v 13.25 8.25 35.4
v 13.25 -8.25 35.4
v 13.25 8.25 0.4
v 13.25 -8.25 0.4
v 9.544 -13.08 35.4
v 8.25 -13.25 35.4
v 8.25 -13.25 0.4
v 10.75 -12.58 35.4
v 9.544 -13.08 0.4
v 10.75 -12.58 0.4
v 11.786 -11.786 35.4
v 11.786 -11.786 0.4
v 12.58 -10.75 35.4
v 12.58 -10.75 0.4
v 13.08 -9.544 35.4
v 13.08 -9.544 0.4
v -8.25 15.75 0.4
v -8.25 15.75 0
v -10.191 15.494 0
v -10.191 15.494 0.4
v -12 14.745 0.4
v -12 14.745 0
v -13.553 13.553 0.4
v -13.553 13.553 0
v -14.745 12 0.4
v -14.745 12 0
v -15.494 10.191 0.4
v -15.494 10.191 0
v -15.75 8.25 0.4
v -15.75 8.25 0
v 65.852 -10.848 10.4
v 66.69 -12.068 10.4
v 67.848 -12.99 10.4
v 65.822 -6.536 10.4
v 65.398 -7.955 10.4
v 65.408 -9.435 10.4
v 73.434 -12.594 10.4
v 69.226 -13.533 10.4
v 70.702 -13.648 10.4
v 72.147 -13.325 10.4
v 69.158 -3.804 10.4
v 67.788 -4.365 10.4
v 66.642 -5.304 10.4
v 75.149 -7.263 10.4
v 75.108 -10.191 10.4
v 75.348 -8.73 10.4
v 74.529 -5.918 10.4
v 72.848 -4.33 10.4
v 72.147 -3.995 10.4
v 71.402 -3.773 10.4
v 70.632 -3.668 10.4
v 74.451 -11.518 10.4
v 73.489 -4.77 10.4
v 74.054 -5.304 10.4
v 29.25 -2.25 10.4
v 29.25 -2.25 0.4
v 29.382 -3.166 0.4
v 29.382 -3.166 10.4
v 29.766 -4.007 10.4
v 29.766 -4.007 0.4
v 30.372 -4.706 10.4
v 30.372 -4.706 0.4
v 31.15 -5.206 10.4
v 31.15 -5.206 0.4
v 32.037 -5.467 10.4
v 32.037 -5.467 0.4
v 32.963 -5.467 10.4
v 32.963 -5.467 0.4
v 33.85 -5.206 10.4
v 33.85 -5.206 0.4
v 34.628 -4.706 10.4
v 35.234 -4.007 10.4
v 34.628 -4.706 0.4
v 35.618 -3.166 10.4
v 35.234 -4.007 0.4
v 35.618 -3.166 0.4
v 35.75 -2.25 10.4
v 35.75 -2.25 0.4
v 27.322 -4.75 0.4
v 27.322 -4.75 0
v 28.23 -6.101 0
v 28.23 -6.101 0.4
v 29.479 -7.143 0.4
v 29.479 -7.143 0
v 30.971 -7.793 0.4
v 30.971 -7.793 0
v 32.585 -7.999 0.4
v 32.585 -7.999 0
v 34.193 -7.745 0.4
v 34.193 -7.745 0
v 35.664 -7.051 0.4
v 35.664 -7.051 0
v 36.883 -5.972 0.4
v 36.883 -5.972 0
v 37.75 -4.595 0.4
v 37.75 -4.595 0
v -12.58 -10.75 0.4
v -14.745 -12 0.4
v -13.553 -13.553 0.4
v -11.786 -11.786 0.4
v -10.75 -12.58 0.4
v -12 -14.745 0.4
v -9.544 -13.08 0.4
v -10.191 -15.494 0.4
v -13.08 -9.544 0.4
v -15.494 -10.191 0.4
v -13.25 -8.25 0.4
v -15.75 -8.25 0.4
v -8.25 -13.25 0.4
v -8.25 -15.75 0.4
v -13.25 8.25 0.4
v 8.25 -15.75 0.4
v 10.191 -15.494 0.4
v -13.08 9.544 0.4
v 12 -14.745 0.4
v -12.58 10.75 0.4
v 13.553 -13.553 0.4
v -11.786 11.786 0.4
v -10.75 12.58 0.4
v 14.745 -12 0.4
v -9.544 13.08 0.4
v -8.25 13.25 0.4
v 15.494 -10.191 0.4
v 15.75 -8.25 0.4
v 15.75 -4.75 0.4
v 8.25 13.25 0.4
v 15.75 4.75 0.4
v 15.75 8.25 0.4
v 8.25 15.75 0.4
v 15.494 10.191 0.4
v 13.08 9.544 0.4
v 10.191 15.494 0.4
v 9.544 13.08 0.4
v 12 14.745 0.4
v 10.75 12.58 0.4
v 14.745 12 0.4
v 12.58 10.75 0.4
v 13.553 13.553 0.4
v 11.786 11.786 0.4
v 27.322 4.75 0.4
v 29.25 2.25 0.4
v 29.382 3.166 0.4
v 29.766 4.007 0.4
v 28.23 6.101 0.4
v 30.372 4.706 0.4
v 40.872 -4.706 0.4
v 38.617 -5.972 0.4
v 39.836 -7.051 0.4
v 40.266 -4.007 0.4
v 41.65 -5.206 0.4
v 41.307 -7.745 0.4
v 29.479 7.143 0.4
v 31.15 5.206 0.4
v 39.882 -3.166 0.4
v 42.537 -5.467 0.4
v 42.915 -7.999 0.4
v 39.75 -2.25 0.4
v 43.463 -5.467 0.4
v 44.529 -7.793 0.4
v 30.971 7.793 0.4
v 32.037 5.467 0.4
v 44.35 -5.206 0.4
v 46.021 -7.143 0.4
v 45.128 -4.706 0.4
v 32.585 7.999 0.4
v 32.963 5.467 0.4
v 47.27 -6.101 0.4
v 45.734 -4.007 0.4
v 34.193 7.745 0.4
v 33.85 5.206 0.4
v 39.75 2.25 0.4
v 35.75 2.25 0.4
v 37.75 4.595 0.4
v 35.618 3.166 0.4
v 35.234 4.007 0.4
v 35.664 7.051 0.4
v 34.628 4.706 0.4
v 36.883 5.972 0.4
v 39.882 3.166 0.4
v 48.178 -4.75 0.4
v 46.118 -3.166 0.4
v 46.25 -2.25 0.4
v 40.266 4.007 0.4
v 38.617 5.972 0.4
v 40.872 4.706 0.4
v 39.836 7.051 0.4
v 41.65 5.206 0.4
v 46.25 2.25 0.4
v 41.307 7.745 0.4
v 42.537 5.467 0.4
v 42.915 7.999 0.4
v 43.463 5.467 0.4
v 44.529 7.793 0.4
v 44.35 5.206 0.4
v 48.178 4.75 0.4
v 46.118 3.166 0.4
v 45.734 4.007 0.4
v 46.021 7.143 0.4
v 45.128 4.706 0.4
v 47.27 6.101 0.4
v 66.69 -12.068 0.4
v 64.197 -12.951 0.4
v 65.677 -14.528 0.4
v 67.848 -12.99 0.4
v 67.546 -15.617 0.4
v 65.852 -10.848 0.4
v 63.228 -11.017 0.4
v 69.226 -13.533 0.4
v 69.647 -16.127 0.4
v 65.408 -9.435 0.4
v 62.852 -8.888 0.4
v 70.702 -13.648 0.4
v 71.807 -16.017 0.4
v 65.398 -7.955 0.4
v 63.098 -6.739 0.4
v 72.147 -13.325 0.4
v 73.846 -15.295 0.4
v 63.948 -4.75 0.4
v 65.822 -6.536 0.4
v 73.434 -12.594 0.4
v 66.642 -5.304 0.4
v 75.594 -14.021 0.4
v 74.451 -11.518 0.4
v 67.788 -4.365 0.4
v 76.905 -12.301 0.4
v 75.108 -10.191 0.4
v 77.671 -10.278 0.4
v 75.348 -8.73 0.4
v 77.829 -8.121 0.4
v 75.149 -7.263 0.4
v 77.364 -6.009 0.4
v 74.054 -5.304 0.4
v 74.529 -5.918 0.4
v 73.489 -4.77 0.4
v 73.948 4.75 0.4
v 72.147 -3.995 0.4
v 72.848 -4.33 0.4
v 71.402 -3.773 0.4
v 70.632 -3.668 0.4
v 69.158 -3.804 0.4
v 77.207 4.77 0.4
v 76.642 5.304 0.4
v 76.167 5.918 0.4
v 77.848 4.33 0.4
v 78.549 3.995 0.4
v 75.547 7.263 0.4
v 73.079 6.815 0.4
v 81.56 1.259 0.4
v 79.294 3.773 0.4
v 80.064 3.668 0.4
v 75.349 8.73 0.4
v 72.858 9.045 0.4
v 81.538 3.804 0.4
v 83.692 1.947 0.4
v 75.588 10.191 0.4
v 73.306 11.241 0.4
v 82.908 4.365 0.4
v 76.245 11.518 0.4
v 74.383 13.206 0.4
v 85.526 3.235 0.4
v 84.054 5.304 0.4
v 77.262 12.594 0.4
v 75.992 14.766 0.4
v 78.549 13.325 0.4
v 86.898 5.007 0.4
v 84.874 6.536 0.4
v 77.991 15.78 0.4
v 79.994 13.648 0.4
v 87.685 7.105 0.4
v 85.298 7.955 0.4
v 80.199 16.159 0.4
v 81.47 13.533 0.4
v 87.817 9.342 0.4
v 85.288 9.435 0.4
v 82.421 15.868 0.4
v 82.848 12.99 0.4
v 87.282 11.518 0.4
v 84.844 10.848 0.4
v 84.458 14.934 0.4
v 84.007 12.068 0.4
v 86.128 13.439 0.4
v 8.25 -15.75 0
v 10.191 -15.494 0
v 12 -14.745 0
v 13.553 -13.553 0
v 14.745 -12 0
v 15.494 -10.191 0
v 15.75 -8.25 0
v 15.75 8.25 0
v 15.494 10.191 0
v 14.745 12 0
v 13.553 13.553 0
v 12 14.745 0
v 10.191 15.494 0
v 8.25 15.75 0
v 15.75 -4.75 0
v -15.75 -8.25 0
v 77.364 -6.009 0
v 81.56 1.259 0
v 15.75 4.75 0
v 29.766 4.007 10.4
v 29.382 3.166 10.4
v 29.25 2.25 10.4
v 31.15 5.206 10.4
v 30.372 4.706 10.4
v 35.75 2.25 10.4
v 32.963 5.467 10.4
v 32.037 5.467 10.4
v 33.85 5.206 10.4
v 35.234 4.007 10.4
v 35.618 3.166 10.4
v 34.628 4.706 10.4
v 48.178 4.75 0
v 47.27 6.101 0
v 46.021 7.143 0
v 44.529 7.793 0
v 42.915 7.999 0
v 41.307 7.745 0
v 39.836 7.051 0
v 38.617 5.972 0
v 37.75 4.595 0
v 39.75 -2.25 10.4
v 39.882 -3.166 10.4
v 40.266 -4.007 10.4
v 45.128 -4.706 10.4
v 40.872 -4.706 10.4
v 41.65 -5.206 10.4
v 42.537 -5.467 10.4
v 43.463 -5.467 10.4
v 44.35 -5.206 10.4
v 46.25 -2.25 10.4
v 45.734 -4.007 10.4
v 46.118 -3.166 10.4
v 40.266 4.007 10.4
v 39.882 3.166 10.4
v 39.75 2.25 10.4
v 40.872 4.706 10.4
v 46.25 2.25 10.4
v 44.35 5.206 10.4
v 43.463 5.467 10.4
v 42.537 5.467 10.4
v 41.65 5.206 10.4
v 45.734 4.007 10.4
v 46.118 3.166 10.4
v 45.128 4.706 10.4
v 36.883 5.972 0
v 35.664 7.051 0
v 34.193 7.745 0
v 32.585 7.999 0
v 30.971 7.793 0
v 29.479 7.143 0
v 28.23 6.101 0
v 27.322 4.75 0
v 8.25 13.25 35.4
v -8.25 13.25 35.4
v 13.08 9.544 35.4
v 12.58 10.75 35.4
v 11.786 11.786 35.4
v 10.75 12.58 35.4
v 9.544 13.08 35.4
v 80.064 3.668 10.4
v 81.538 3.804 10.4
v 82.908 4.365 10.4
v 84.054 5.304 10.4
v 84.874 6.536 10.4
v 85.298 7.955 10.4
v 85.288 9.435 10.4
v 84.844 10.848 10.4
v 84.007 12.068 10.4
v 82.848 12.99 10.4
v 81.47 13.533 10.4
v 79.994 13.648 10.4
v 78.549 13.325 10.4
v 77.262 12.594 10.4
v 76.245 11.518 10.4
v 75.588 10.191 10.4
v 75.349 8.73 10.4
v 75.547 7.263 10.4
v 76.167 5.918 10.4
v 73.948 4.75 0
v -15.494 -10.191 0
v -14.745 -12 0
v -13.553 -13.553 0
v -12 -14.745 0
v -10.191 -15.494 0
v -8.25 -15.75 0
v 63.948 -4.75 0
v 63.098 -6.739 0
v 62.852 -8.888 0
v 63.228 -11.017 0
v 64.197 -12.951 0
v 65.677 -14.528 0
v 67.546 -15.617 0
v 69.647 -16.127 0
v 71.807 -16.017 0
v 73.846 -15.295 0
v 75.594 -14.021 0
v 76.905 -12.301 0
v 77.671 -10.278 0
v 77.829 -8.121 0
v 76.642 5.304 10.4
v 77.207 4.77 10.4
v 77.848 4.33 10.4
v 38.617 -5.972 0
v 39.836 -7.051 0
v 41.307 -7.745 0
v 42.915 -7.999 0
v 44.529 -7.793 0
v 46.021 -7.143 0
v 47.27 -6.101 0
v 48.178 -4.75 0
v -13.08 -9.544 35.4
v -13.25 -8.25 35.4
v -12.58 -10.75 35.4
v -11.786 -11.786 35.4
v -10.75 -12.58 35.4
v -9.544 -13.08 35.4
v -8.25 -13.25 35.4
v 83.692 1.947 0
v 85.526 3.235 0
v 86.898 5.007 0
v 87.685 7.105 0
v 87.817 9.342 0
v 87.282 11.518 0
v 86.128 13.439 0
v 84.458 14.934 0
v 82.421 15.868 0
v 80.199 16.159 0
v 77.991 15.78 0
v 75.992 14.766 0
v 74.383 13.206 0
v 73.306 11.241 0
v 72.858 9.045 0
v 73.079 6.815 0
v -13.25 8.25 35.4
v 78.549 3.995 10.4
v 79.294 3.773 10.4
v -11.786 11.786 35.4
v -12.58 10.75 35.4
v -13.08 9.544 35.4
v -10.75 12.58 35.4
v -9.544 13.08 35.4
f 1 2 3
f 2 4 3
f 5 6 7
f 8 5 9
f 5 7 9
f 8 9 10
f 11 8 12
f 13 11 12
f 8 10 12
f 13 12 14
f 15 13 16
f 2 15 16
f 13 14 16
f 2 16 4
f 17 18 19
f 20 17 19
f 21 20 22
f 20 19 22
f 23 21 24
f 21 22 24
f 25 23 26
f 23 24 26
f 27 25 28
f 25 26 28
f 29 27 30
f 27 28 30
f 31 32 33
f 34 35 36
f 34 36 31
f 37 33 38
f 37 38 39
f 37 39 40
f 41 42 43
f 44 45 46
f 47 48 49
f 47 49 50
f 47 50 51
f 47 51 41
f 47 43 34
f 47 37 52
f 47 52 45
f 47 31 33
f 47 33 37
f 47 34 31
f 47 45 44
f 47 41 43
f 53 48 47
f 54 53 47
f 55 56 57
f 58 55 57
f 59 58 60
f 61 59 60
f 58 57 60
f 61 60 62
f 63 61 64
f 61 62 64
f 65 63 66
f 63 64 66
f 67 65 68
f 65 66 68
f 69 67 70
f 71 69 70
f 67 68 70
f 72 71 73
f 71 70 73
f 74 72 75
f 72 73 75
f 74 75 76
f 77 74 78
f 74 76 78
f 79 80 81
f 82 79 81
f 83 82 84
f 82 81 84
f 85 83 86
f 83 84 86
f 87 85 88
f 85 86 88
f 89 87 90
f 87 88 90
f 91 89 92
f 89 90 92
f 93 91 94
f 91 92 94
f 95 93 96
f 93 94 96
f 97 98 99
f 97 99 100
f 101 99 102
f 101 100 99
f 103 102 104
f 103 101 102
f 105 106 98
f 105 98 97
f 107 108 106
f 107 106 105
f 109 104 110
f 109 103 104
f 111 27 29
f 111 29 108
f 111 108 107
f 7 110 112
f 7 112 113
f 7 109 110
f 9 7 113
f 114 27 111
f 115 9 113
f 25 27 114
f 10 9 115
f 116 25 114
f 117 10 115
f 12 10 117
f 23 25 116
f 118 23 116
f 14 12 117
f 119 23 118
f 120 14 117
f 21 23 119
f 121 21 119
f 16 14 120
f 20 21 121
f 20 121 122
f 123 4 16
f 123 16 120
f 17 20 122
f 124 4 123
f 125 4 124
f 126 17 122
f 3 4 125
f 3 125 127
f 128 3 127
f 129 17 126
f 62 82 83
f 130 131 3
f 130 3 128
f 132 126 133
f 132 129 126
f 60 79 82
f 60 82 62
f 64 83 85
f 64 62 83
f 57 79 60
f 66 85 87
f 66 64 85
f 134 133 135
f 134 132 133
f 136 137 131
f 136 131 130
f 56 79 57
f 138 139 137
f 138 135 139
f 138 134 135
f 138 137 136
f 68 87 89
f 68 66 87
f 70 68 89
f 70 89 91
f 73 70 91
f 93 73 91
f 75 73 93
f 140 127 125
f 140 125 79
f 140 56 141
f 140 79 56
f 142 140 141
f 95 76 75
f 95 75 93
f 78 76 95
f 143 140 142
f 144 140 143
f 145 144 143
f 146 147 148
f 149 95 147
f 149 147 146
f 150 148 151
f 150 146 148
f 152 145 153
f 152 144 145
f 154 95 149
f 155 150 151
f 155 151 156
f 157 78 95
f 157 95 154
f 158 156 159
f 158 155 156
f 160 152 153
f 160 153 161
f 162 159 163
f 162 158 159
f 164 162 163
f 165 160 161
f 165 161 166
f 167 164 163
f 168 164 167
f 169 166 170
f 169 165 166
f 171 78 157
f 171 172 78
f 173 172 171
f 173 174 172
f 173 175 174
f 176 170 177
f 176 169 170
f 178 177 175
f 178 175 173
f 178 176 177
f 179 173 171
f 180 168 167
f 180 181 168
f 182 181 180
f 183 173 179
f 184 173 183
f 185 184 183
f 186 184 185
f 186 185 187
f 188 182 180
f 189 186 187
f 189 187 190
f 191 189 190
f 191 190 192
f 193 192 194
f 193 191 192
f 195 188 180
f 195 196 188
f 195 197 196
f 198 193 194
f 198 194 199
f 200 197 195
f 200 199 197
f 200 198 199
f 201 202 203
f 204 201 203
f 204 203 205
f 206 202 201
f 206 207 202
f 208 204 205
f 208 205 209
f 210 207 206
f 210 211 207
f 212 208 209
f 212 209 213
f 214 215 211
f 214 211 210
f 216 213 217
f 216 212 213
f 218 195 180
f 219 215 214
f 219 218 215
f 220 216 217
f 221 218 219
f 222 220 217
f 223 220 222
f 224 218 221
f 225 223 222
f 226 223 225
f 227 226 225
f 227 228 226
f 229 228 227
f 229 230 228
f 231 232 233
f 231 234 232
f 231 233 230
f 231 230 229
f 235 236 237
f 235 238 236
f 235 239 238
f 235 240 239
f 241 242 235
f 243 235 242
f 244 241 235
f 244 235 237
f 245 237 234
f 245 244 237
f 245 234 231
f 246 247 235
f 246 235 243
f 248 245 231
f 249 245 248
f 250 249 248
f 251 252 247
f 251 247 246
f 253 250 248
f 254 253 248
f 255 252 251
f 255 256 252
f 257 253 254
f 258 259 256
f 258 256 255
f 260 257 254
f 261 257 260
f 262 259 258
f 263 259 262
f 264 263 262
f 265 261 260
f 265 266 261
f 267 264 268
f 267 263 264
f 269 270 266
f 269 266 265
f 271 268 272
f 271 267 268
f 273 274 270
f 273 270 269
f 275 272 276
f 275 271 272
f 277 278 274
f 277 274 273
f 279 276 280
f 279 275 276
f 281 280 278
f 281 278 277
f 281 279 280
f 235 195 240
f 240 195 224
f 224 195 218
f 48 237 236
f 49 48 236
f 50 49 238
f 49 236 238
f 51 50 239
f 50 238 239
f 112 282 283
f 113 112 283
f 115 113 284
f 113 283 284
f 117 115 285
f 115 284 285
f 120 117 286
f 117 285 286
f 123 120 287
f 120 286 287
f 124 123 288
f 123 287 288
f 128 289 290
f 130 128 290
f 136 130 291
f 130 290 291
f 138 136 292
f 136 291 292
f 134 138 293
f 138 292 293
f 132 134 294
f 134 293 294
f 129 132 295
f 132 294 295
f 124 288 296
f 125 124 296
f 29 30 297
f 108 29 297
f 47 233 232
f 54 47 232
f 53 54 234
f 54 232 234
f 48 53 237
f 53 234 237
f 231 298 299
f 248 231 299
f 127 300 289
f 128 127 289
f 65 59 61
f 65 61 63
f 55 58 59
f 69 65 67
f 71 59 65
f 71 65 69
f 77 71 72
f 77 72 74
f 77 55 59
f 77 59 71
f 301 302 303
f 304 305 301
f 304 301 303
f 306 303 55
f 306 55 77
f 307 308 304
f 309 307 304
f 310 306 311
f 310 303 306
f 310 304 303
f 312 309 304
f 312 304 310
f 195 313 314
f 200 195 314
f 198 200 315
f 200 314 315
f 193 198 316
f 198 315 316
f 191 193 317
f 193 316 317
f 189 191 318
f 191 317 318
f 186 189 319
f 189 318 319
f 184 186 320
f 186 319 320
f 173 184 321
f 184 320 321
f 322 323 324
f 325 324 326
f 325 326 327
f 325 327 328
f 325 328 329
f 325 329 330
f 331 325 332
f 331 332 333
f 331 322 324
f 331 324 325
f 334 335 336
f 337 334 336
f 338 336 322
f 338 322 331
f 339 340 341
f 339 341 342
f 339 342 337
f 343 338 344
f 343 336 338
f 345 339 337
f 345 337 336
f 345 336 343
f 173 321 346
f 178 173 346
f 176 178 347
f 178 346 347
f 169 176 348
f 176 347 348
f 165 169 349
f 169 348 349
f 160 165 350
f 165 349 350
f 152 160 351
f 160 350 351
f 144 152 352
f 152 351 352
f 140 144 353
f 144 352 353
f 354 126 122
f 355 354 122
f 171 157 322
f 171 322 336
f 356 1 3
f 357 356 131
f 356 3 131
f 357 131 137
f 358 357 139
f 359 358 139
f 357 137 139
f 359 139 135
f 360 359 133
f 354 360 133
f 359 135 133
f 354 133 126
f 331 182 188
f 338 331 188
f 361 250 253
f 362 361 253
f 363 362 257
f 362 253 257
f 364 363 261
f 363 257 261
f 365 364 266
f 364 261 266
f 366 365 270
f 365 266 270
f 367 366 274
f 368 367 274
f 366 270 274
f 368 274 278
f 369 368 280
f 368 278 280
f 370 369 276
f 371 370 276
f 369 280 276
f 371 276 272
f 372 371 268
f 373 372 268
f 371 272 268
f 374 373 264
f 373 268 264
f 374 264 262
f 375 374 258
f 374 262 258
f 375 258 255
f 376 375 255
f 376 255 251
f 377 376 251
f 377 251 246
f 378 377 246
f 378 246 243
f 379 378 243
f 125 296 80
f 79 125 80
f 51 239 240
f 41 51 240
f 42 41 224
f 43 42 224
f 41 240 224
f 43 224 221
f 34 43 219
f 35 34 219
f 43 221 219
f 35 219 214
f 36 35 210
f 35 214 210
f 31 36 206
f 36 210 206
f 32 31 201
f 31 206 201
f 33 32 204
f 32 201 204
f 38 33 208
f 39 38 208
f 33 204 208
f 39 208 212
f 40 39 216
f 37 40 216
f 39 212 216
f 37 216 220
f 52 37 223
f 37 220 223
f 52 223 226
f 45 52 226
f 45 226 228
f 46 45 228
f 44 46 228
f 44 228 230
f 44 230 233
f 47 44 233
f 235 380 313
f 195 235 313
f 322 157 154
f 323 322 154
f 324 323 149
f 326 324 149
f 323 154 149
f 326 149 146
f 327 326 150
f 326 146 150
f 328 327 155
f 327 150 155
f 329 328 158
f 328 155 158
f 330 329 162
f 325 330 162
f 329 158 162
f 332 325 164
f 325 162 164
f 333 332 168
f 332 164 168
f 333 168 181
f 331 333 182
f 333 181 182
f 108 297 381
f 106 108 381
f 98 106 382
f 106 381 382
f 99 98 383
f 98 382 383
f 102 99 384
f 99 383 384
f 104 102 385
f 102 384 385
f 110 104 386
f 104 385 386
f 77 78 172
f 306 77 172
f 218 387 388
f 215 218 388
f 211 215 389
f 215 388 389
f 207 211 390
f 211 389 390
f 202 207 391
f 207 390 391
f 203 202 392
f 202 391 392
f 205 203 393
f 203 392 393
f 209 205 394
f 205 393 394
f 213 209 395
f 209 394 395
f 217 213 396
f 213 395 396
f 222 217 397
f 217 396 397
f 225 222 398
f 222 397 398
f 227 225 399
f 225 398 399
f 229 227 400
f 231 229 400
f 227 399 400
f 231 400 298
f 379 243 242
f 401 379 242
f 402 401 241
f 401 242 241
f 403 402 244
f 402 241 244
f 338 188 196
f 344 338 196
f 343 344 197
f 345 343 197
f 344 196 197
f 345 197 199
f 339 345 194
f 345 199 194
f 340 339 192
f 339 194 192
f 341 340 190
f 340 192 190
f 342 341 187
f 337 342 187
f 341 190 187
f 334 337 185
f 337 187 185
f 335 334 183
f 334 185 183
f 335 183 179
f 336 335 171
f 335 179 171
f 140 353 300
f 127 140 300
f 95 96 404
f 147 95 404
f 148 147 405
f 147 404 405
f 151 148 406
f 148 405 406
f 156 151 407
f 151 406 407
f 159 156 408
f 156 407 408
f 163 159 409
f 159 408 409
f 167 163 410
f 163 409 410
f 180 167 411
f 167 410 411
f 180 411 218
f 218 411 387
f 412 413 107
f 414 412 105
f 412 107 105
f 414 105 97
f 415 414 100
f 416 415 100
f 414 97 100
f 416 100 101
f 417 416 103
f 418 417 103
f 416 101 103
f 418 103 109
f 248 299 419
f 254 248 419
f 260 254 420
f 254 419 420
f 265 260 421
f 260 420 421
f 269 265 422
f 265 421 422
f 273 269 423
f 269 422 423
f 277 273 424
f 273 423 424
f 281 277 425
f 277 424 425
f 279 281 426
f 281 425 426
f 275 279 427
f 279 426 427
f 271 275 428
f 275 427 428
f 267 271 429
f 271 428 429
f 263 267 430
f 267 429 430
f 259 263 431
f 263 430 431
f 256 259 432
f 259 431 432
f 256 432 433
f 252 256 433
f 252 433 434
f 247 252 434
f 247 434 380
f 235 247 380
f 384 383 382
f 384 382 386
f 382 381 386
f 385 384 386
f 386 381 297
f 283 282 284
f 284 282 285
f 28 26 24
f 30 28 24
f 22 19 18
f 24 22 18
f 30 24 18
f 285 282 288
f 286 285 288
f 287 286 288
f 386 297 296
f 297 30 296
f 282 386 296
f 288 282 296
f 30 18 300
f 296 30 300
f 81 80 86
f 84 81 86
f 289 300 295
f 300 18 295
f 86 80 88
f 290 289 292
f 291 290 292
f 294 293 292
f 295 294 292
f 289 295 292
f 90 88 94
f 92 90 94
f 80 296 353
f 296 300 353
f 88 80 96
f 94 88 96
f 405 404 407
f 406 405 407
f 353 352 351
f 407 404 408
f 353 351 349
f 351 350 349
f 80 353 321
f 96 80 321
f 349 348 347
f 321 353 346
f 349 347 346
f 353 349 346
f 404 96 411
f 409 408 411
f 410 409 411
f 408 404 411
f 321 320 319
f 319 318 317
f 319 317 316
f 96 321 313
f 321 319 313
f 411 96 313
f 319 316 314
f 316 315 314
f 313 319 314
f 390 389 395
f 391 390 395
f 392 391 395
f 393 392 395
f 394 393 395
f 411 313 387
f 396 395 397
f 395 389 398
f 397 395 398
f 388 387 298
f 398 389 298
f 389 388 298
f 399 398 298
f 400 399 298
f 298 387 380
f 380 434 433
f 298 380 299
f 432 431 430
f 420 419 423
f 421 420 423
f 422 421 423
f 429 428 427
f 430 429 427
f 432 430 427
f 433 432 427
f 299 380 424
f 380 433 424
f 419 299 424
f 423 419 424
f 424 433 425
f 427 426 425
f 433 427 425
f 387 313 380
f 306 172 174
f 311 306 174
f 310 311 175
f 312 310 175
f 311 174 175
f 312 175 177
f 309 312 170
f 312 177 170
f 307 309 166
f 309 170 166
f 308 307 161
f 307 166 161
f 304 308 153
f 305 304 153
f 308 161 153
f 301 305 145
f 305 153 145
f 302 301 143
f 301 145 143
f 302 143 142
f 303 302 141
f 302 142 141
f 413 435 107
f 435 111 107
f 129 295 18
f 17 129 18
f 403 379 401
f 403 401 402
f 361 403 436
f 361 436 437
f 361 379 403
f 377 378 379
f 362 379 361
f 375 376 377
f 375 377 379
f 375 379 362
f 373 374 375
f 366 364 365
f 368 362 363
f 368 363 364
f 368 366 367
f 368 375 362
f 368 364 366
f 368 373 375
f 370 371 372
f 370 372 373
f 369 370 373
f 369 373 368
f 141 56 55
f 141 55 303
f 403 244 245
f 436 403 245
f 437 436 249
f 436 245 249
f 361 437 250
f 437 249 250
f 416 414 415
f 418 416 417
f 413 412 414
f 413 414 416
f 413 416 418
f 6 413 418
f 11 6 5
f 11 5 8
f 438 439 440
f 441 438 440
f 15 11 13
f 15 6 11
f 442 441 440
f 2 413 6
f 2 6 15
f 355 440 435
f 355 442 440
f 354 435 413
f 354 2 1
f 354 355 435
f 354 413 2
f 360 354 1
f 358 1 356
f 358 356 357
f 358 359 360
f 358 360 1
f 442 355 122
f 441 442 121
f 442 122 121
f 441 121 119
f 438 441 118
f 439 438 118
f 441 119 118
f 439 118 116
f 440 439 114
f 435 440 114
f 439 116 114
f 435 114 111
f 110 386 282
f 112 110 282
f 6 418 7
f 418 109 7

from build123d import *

# Parameters (mm, degrees)
F0_W     = 16
F0_H     = 4.5
F0_W_2   = 6.5
F0_W_3   = 4
F1_DEPTH = 0.4
F2_W     = 6.5
F2_H     = 4.5
F3_DEPTH = 10
F4_DEPTH = 25


with BuildPart() as f1:
    # F0 (on Top) → F1 (new body)
    with BuildSketch(Plane.XY):
        with BuildLine():
            Line((15.75, 4.75), (15.75, 8.25))
            ThreePointArc((15.75, 8.25), (13.5533008589, 13.5533008589), (8.25, 15.75))
            Line((8.25, 15.75), (-8.25, 15.75))
            ThreePointArc((-8.25, 15.75), (-13.5533008589, 13.5533008589), (-15.75, 8.25))
            Line((-15.75, 8.25), (-15.75, -8.25))
            ThreePointArc((-15.75, -8.25), (-13.5533008589, -13.5533008589), (-8.25, -15.75))
            Line((-8.25, -15.75), (8.25, -15.75))
            ThreePointArc((8.25, -15.75), (13.5533008589, -13.5533008589), (15.75, -8.25))
            Line((15.75, -8.25), (15.75, -4.75))
            Line((15.75, -4.75), (27.3219212057, -4.75))
            ThreePointArc((27.3219212057, -4.75), (32.5853423404, -7.9993666334), (37.75, -4.5952078799))
            ThreePointArc((37.75, -4.5952078799), (42.9146576596, -7.9993666334), (48.1780787943, -4.75))
            Line((48.1780787943, -4.75), (63.9480829801, -4.75))
            ThreePointArc((63.9480829801, -4.75), (69.6474451199, -16.1274567319), (77.3637435709, -6.0087617221))
            Line((77.3637435709, -6.0087617221), (81.5596501878, 1.2587617221))
            ThreePointArc((81.5596501878, 1.2587617221), (83.4749132345, 15.4773568118), (73.9480829801, 4.75))
            Line((73.9480829801, 4.75), (48.1780787943, 4.75))
            ThreePointArc((48.1780787943, 4.75), (42.9146576596, 7.9993666334), (37.75, 4.5952078799))
            ThreePointArc((37.75, 4.5952078799), (32.5853423404, 7.9993666334), (27.3219212057, 4.75))
            Line((27.3219212057, 4.75), (15.75, 4.75))
        make_face()
        with BuildLine():
            ThreePointArc((-13.25, 8.25), (-11.7855339059, 11.7855339059), (-8.25, 13.25))
            Line((-8.25, 13.25), (-4.5, 13.25))
            Line((-4.5, 13.25), (4.5, 13.25))
            Line((4.5, 13.25), (8.25, 13.25))
            ThreePointArc((8.25, 13.25), (11.7855339059, 11.7855339059), (13.25, 8.25))
            Line((13.25, 8.25), (13.25, 4.5))
            Line((13.25, 4.5), (13.25, 2.25))
            Line((13.25, 2.25), (29.25, 2.25))
            ThreePointArc((29.25, 2.25), (32.5, 5.5), (35.75, 2.25))
            Line((35.75, 2.25), (39.75, 2.25))
            ThreePointArc((39.75, 2.25), (43, 5.5), (46.25, 2.25))
            Line((46.25, 2.25), (74.0490381057, 2.25))
            Line((74.0490381057, 2.25), (76.1669476654, 5.9183269633))
            ThreePointArc((76.1669476654, 5.9183269633), (82.8480762114, 12.9903810568), (80.0640619824, 3.6683269633))
            Line((80.0640619824, 3.6683269633), (74.5292047573, -5.9183269633))
            ThreePointArc((74.5292047573, -5.9183269633), (67.8480762114, -12.9903810568), (70.6320904403, -3.6683269633))
            Line((70.6320904403, -3.6683269633), (71.4509618943, -2.25))
            Line((71.4509618943, -2.25), (46.25, -2.25))
            ThreePointArc((46.25, -2.25), (43, -5.5), (39.75, -2.25))
            Line((39.75, -2.25), (35.75, -2.25))
            ThreePointArc((35.75, -2.25), (32.5, -5.5), (29.25, -2.25))
            Line((29.25, -2.25), (13.25, -2.25))
            Line((13.25, -2.25), (13.25, -4.5))
            Line((13.25, -4.5), (13.25, -8.25))
            ThreePointArc((13.25, -8.25), (11.7855339059, -11.7855339059), (8.25, -13.25))
            Line((8.25, -13.25), (4.5, -13.25))
            Line((4.5, -13.25), (-4.5, -13.25))
            Line((-4.5, -13.25), (-8.25, -13.25))
            ThreePointArc((-8.25, -13.25), (-11.7855339059, -11.7855339059), (-13.25, -8.25))
            Line((-13.25, -8.25), (-13.25, -4.5))
            Line((-13.25, -4.5), (-13.25, 4.5))
            Line((-13.25, 4.5), (-13.25, 8.25))
        make_face(mode=Mode.SUBTRACT)
        Polygon((74.0490381057, 2.25), (46.25, 2.25), (46.25, -2.25), (71.4509618943, -2.25), align=None)
        Polygon((4.5, -4.5), (0, -4.5), (-4.5, -4.5), (-4.5, -13.25), (4.5, -13.25), align=None)
        Polygon((-4.5, 0), (-4.5, 4.5), (-13.25, 4.5), (-13.25, -4.5), (-4.5, -4.5), align=None)
        Polygon((4.5, 13.25), (-4.5, 13.25), (-4.5, 4.5), (0, 4.5), (4.5, 4.5), align=None)
        Polygon((13.25, 4.5), (4.5, 4.5), (4.5, 0), (4.5, -4.5), (13.25, -4.5), (13.25, -2.25), (13.25, 2.25), align=None)
        with BuildLine():
            ThreePointArc((80.0640619824, 3.6683269633), (82.8480762114, 12.9903810568), (76.1669476654, 5.9183269633))
            ThreePointArc((76.1669476654, 5.9183269633), (77.8480762114, 4.3301270189), (80.0640619824, 3.6683269633))
        make_face()
        with BuildLine():
            ThreePointArc((74.5292047573, -5.9183269633), (72.8480762114, -4.3301270189), (70.6320904403, -3.6683269633))
            ThreePointArc((70.6320904403, -3.6683269633), (67.8480762114, -12.9903810568), (74.5292047573, -5.9183269633))
        make_face()
        with Locations((21.25, 0)):
            Rectangle(F0_W, F0_H)
        with BuildLine():
            Line((-4.5, -4.5), (-13.25, -4.5))
            Line((-13.25, -4.5), (-13.25, -8.25))
            ThreePointArc((-13.25, -8.25), (-11.7855339059, -11.7855339059), (-8.25, -13.25))
            Line((-8.25, -13.25), (-4.5, -13.25))
            Line((-4.5, -13.25), (-4.5, -4.5))
        make_face()
        with BuildLine():
            Line((8.25, 13.25), (4.5, 13.25))
            Line((4.5, 13.25), (4.5, 4.5))
            Line((4.5, 4.5), (13.25, 4.5))
            Line((13.25, 4.5), (13.25, 8.25))
            ThreePointArc((13.25, 8.25), (11.7855339059, 11.7855339059), (8.25, 13.25))
        make_face()
        with BuildLine():
            Line((13.25, -4.5), (4.5, -4.5))
            Line((4.5, -4.5), (4.5, -13.25))
            Line((4.5, -13.25), (8.25, -13.25))
            ThreePointArc((8.25, -13.25), (11.7855339059, -11.7855339059), (13.25, -8.25))
            Line((13.25, -8.25), (13.25, -4.5))
        make_face()
        with BuildLine():
            Line((-4.5, 13.25), (-8.25, 13.25))
            ThreePointArc((-8.25, 13.25), (-11.7855339059, 11.7855339059), (-13.25, 8.25))
            Line((-13.25, 8.25), (-13.25, 4.5))
            Line((-13.25, 4.5), (-4.5, 4.5))
            Line((-4.5, 4.5), (-4.5, 13.25))
        make_face()
        with BuildLine():
            ThreePointArc((0, 4.5), (-3.1819805153, 3.1819805153), (-4.5, 0))
            ThreePointArc((-4.5, 0), (-3.1819805153, -3.1819805153), (0, -4.5))
            ThreePointArc((0, -4.5), (3.1819805153, -3.1819805153), (4.5, 0))
            ThreePointArc((4.5, 0), (3.1819805153, 3.1819805153), (0, 4.5))
        make_face()
        with BuildLine():
            Line((76.1669476654, 5.9183269633), (74.0490381057, 2.25))
            Line((74.0490381057, 2.25), (71.4509618943, -2.25))
            Line((71.4509618943, -2.25), (70.6320904403, -3.6683269633))
            ThreePointArc((70.6320904403, -3.6683269633), (72.8480762114, -4.3301270189), (74.5292047573, -5.9183269633))
            Line((74.5292047573, -5.9183269633), (80.0640619824, 3.6683269633))
            ThreePointArc((80.0640619824, 3.6683269633), (77.8480762114, 4.3301270189), (76.1669476654, 5.9183269633))
        make_face()
        with Locations((43, 0)):
            Rectangle(F0_W_2, F0_H)
        with Locations((32.5, 0)):
            Rectangle(F0_W_2, F0_H)
        with Locations((37.75, 0)):
            Rectangle(F0_W_3, F0_H)
        with BuildLine():
            Line((46.25, -2.25), (39.75, -2.25))
            ThreePointArc((39.75, -2.25), (43, -5.5), (46.25, -2.25))
        make_face()
        with BuildLine():
            ThreePointArc((35.75, 2.25), (32.5, 5.5), (29.25, 2.25))
            Line((29.25, 2.25), (35.75, 2.25))
        make_face()
        with BuildLine():
            Line((35.75, -2.25), (29.25, -2.25))
            ThreePointArc((29.25, -2.25), (32.5, -5.5), (35.75, -2.25))
        make_face()
        with BuildLine():
            ThreePointArc((46.25, 2.25), (43, 5.5), (39.75, 2.25))
            Line((39.75, 2.25), (46.25, 2.25))
        make_face()
        with BuildLine():
            Line((4.5, 0), (4.5, 4.5))
            Line((4.5, 4.5), (0, 4.5))
            ThreePointArc((0, 4.5), (3.1819805153, 3.1819805153), (4.5, 0))
        make_face()
        with BuildLine():
            Line((0, 4.5), (-4.5, 4.5))
            Line((-4.5, 4.5), (-4.5, 0))
            ThreePointArc((-4.5, 0), (-3.1819805153, 3.1819805153), (0, 4.5))
        make_face()
        with BuildLine():
            ThreePointArc((0, -4.5), (-3.1819805153, -3.1819805153), (-4.5, 0))
            Line((-4.5, 0), (-4.5, -4.5))
            Line((-4.5, -4.5), (0, -4.5))
        make_face()
        with BuildLine():
            Line((4.5, -4.5), (4.5, 0))
            ThreePointArc((4.5, 0), (3.1819805153, -3.1819805153), (0, -4.5))
            Line((0, -4.5), (4.5, -4.5))
        make_face()
    extrude(amount=F1_DEPTH)

    # F2 (on face) → F3 (join)
    with BuildSketch(Plane.XY.offset(0.4)):
        with BuildLine():
            Line((-4.5, 13.25), (-8.25, 13.25))
            ThreePointArc((-8.25, 13.25), (-11.7855339059, 11.7855339059), (-13.25, 8.25))
            Line((-13.25, 8.25), (-13.25, 4.5))
            Line((-13.25, 4.5), (-4.5, 4.5))
            Line((-4.5, 4.5), (-4.5, 13.25))
        make_face()
        Polygon((4.5, 13.25), (-4.5, 13.25), (-4.5, 4.5), (0, 4.5), (4.5, 4.5), align=None)
        with BuildLine():
            Line((8.25, 13.25), (4.5, 13.25))
            Line((4.5, 13.25), (4.5, 4.5))
            Line((4.5, 4.5), (13.25, 4.5))
            Line((13.25, 4.5), (13.25, 8.25))
            ThreePointArc((13.25, 8.25), (11.7855339059, 11.7855339059), (8.25, 13.25))
        make_face()
        Polygon((13.25, 4.5), (4.5, 4.5), (4.5, 0), (4.5, -4.5), (13.25, -4.5), (13.25, -2.25), (13.25, 2.25), align=None)
        with BuildLine():
            Line((13.25, -4.5), (4.5, -4.5))
            Line((4.5, -4.5), (4.5, -13.25))
            Line((4.5, -13.25), (8.25, -13.25))
            ThreePointArc((8.25, -13.25), (11.7855339059, -11.7855339059), (13.25, -8.25))
            Line((13.25, -8.25), (13.25, -4.5))
        make_face()
        Polygon((4.5, -4.5), (0, -4.5), (-4.5, -4.5), (-4.5, -13.25), (4.5, -13.25), align=None)
        with BuildLine():
            Line((-4.5, -4.5), (-13.25, -4.5))
            Line((-13.25, -4.5), (-13.25, -8.25))
            ThreePointArc((-13.25, -8.25), (-11.7855339059, -11.7855339059), (-8.25, -13.25))
            Line((-8.25, -13.25), (-4.5, -13.25))
            Line((-4.5, -13.25), (-4.5, -4.5))
        make_face()
        Polygon((-4.5, 0), (-4.5, 4.5), (-13.25, 4.5), (-13.25, -4.5), (-4.5, -4.5), align=None)
        with BuildLine():
            Line((4.5, 0), (4.5, 4.5))
            Line((4.5, 4.5), (0, 4.5))
            ThreePointArc((0, 4.5), (3.1819805153, 3.1819805153), (4.5, 0))
        make_face()
        with BuildLine():
            Line((4.5, -4.5), (4.5, 0))
            ThreePointArc((4.5, 0), (3.1819805153, -3.1819805153), (0, -4.5))
            Line((0, -4.5), (4.5, -4.5))
        make_face()
        with BuildLine():
            ThreePointArc((0, -4.5), (-3.1819805153, -3.1819805153), (-4.5, 0))
            Line((-4.5, 0), (-4.5, -4.5))
            Line((-4.5, -4.5), (0, -4.5))
        make_face()
        with BuildLine():
            Line((0, 4.5), (-4.5, 4.5))
            Line((-4.5, 4.5), (-4.5, 0))
            ThreePointArc((-4.5, 0), (-3.1819805153, 3.1819805153), (0, 4.5))
        make_face()
        with BuildLine():
            ThreePointArc((0, 4.5), (-3.1819805153, 3.1819805153), (-4.5, 0))
            ThreePointArc((-4.5, 0), (-3.1819805153, -3.1819805153), (0, -4.5))
            ThreePointArc((0, -4.5), (3.1819805153, -3.1819805153), (4.5, 0))
            ThreePointArc((4.5, 0), (3.1819805153, 3.1819805153), (0, 4.5))
        make_face()
        with Locations((32.5, 0)):
            Rectangle(F2_W, F2_H)
        with BuildLine():
            ThreePointArc((35.75, 2.25), (32.5, 5.5), (29.25, 2.25))
            Line((29.25, 2.25), (35.75, 2.25))
        make_face()
        with BuildLine():
            Line((35.75, -2.25), (29.25, -2.25))
            ThreePointArc((29.25, -2.25), (32.5, -5.5), (35.75, -2.25))
        make_face()
        with BuildLine():
            Line((46.25, -2.25), (39.75, -2.25))
            ThreePointArc((39.75, -2.25), (43, -5.5), (46.25, -2.25))
        make_face()
        with Locations((43, 0)):
            Rectangle(F2_W, F2_H)
        with BuildLine():
            ThreePointArc((46.25, 2.25), (43, 5.5), (39.75, 2.25))
            Line((39.75, 2.25), (46.25, 2.25))
        make_face()
        with BuildLine():
            ThreePointArc((72.8480762114, -4.3301270189), (71.7788727151, -3.8693437522), (70.6320904403, -3.6683269633))
            ThreePointArc((70.6320904403, -3.6683269633), (67.8480762114, -12.9903810568), (74.5292047573, -5.9183269633))
            ThreePointArc((74.5292047573, -5.9183269633), (73.7817279741, -5.0256927751), (72.8480762114, -4.3301270189))
        make_face()
        with BuildLine():
            ThreePointArc((80.0640619824, 3.6683269633), (82.8480762114, 12.9903810568), (76.1669476654, 5.9183269633))
            ThreePointArc((76.1669476654, 5.9183269633), (76.9144244486, 5.0256927751), (77.8480762114, 4.3301270189))
            ThreePointArc((77.8480762114, 4.3301270189), (78.9172797076, 3.8693437522), (80.0640619824, 3.6683269633))
        make_face()
    extrude(amount=F3_DEPTH)

    # F4 (add): a face of the model
    f4_faces = [f1.faces().sort_by_distance(p)[0] for p in [
        (0, 0, 10.4),
    ]]
    extrude(f4_faces, amount=F4_DEPTH)


solid = f1.part
